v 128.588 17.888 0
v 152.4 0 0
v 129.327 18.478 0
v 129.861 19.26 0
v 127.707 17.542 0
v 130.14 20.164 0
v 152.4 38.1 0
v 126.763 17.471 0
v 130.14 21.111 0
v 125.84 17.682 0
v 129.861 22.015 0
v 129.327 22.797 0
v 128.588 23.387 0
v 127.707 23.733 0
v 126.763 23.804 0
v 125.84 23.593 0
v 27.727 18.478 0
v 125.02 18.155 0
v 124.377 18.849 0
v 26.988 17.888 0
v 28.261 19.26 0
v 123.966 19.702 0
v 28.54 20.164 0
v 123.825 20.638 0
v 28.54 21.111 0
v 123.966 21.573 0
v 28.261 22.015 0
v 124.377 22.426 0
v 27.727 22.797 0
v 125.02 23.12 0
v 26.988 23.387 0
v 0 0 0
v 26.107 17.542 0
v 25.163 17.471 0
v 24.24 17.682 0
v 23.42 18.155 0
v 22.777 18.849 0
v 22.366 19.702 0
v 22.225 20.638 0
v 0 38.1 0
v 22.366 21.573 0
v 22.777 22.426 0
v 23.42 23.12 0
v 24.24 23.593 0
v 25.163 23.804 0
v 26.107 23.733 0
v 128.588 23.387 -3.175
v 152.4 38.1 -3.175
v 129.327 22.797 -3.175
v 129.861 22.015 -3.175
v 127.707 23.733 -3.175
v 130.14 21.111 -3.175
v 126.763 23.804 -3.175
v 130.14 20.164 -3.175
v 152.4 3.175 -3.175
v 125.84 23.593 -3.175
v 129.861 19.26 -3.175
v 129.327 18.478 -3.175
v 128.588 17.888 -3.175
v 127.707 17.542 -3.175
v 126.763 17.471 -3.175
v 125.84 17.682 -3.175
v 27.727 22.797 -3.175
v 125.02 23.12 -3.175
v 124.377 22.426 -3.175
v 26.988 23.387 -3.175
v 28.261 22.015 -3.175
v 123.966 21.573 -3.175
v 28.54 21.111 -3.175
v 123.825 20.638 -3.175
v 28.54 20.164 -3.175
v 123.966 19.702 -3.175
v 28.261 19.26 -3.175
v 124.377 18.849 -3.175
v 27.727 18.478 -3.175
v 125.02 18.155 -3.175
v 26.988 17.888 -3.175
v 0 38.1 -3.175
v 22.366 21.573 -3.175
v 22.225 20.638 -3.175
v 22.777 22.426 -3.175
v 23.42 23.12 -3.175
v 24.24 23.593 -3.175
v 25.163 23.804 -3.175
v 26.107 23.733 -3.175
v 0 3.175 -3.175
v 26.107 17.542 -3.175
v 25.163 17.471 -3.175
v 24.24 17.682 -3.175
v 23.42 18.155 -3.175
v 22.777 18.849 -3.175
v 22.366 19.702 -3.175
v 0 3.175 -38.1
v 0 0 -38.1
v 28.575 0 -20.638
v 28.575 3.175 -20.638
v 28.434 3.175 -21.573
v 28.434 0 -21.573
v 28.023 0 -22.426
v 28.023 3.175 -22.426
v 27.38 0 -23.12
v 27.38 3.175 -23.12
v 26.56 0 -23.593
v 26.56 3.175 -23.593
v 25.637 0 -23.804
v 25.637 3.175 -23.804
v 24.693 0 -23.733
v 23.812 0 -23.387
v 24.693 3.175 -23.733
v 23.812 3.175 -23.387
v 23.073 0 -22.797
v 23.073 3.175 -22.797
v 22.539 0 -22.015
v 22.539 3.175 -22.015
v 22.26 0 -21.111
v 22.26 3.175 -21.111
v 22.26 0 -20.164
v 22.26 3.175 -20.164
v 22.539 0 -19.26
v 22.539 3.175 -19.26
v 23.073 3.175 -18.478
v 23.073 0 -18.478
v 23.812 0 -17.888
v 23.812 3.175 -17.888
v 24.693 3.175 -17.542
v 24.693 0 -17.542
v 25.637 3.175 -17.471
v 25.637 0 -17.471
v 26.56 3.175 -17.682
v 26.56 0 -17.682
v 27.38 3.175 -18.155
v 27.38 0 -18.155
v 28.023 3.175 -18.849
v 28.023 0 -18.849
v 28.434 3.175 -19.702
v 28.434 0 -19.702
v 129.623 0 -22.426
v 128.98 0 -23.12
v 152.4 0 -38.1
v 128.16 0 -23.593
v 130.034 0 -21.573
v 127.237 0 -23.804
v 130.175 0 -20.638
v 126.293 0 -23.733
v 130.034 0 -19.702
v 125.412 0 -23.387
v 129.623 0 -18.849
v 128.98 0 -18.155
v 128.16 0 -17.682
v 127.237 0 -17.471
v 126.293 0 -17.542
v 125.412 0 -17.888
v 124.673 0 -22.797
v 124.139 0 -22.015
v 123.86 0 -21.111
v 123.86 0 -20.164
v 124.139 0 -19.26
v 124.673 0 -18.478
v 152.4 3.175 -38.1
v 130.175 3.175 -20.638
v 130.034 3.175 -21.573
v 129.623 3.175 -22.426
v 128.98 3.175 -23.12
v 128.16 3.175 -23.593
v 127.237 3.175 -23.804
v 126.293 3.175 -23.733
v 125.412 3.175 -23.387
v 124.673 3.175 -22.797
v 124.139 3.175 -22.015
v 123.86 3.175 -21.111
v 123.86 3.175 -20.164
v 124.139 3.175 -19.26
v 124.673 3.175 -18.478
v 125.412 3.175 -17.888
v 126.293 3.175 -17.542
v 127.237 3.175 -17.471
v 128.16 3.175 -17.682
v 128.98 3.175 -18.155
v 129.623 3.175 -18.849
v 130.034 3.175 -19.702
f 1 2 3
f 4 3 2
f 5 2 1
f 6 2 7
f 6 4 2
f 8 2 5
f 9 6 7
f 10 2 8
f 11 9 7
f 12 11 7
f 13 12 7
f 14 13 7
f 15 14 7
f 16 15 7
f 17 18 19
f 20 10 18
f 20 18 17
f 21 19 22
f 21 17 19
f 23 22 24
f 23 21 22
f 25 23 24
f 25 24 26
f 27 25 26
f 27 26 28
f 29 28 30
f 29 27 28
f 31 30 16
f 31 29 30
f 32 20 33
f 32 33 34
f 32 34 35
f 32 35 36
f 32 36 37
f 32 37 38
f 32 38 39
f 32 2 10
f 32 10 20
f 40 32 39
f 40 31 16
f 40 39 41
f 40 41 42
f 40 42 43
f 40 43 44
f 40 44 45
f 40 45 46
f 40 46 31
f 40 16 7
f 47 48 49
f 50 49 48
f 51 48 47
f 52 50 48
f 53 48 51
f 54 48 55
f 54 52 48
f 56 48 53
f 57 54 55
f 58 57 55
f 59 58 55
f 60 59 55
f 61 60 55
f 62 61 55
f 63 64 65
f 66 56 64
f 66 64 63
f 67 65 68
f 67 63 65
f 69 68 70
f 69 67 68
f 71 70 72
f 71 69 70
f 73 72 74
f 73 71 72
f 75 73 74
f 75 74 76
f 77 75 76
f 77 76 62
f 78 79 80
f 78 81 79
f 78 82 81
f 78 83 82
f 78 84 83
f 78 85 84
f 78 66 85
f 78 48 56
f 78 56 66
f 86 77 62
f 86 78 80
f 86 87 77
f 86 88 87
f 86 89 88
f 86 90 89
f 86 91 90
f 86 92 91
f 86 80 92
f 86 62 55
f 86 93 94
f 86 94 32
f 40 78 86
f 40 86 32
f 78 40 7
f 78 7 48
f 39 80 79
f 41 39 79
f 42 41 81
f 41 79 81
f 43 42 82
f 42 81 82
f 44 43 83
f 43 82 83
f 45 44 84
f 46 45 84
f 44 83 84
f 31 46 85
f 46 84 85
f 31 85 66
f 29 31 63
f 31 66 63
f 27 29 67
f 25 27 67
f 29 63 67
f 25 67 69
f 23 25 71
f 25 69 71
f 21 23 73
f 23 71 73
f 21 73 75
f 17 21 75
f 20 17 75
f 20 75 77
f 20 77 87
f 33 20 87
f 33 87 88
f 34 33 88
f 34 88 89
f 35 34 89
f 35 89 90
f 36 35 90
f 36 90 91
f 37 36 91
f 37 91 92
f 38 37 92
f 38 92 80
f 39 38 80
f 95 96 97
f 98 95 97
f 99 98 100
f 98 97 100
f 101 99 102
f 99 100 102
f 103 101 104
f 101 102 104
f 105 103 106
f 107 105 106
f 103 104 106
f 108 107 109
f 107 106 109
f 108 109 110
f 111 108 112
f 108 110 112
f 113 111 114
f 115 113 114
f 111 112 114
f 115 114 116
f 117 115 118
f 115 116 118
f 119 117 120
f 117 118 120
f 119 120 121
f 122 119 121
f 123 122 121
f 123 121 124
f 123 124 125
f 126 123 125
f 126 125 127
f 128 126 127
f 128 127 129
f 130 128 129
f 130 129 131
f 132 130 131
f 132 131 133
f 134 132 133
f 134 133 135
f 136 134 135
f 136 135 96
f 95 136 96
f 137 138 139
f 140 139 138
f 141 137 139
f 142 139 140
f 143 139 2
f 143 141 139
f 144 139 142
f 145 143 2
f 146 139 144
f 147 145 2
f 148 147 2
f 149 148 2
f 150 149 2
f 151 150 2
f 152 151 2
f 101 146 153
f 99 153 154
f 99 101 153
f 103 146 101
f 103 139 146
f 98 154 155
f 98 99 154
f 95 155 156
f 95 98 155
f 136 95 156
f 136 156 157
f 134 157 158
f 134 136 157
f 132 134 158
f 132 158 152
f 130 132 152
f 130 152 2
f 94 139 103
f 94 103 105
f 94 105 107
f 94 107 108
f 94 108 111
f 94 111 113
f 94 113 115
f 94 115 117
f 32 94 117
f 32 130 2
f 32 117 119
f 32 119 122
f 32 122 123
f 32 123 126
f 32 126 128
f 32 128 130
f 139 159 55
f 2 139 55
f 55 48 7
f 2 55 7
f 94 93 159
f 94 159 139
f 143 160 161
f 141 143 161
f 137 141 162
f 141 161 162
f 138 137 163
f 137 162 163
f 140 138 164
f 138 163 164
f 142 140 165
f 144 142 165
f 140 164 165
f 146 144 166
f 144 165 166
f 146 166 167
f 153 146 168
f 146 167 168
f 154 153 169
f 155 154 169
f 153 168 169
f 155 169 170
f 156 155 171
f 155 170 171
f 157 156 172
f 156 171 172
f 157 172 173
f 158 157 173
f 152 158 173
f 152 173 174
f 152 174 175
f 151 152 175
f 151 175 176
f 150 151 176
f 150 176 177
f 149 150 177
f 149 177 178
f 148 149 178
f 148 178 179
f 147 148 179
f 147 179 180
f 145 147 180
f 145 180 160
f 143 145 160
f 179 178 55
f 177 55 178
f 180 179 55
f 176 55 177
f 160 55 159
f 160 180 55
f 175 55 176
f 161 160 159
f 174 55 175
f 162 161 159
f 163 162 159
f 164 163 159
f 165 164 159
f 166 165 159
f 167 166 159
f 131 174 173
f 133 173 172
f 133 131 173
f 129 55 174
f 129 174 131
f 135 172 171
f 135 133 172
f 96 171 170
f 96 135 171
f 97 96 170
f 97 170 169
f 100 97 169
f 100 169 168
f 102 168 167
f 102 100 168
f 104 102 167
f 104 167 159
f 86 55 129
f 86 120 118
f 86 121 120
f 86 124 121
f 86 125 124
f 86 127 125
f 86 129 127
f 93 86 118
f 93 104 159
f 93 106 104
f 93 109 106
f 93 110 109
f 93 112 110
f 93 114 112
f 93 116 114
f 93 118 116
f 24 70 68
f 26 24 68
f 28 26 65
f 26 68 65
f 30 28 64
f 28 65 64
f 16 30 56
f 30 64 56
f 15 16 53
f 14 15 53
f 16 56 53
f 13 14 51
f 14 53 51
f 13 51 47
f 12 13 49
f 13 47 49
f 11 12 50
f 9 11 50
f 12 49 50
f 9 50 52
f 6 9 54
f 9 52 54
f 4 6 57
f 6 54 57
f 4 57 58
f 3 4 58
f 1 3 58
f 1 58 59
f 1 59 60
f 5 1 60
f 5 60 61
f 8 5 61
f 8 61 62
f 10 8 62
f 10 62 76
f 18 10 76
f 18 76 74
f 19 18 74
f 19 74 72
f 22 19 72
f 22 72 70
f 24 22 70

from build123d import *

# Parameters (mm, degrees)
BOSS_EXTRUDE1_DEPTH = 152.4
SKETCH5_R           = 3.175
CUT_EXTRUDE3_DEPTH  = 4.175
SKETCH6_R           = 3.175
CUT_EXTRUDE4_DEPTH  = 4.175


with BuildPart() as part:
    # Sketch1 → Boss-Extrude1 (new body)
    with BuildSketch(Plane(origin=(0, 0, 0), x_dir=(0, 0, -1), z_dir=(1, 0, 0))):
        Polygon((0, 0), (0, 38.1), (3.175, 38.1), (3.175, 3.175), (38.1, 3.175), (38.1, 0), align=None)
    extrude(amount=BOSS_EXTRUDE1_DEPTH)

    # Sketch5 → Cut-Extrude3 (cut, through all)
    with BuildSketch(Plane(origin=(0, 0, -3.175), x_dir=(-1, 0, 0), z_dir=(0, 0, -1))):
        with Locations((-127, 20.6375)):
            Circle(SKETCH5_R)
        with Locations((-25.4, 20.6375)):
            Circle(SKETCH5_R)
    extrude(amount=-CUT_EXTRUDE3_DEPTH, mode=Mode.SUBTRACT)

    # Sketch6 → Cut-Extrude4 (cut, through all)
    with BuildSketch(Plane(origin=(0, 3.175, 0), x_dir=(1, 0, 0), z_dir=(0, 1, 0))):
        with Locations((25.4, 20.6375)):
            Circle(SKETCH6_R)
        with Locations((127, 20.6375)):
            Circle(SKETCH6_R)
    extrude(amount=-CUT_EXTRUDE4_DEPTH, mode=Mode.SUBTRACT)


solid = part.part
